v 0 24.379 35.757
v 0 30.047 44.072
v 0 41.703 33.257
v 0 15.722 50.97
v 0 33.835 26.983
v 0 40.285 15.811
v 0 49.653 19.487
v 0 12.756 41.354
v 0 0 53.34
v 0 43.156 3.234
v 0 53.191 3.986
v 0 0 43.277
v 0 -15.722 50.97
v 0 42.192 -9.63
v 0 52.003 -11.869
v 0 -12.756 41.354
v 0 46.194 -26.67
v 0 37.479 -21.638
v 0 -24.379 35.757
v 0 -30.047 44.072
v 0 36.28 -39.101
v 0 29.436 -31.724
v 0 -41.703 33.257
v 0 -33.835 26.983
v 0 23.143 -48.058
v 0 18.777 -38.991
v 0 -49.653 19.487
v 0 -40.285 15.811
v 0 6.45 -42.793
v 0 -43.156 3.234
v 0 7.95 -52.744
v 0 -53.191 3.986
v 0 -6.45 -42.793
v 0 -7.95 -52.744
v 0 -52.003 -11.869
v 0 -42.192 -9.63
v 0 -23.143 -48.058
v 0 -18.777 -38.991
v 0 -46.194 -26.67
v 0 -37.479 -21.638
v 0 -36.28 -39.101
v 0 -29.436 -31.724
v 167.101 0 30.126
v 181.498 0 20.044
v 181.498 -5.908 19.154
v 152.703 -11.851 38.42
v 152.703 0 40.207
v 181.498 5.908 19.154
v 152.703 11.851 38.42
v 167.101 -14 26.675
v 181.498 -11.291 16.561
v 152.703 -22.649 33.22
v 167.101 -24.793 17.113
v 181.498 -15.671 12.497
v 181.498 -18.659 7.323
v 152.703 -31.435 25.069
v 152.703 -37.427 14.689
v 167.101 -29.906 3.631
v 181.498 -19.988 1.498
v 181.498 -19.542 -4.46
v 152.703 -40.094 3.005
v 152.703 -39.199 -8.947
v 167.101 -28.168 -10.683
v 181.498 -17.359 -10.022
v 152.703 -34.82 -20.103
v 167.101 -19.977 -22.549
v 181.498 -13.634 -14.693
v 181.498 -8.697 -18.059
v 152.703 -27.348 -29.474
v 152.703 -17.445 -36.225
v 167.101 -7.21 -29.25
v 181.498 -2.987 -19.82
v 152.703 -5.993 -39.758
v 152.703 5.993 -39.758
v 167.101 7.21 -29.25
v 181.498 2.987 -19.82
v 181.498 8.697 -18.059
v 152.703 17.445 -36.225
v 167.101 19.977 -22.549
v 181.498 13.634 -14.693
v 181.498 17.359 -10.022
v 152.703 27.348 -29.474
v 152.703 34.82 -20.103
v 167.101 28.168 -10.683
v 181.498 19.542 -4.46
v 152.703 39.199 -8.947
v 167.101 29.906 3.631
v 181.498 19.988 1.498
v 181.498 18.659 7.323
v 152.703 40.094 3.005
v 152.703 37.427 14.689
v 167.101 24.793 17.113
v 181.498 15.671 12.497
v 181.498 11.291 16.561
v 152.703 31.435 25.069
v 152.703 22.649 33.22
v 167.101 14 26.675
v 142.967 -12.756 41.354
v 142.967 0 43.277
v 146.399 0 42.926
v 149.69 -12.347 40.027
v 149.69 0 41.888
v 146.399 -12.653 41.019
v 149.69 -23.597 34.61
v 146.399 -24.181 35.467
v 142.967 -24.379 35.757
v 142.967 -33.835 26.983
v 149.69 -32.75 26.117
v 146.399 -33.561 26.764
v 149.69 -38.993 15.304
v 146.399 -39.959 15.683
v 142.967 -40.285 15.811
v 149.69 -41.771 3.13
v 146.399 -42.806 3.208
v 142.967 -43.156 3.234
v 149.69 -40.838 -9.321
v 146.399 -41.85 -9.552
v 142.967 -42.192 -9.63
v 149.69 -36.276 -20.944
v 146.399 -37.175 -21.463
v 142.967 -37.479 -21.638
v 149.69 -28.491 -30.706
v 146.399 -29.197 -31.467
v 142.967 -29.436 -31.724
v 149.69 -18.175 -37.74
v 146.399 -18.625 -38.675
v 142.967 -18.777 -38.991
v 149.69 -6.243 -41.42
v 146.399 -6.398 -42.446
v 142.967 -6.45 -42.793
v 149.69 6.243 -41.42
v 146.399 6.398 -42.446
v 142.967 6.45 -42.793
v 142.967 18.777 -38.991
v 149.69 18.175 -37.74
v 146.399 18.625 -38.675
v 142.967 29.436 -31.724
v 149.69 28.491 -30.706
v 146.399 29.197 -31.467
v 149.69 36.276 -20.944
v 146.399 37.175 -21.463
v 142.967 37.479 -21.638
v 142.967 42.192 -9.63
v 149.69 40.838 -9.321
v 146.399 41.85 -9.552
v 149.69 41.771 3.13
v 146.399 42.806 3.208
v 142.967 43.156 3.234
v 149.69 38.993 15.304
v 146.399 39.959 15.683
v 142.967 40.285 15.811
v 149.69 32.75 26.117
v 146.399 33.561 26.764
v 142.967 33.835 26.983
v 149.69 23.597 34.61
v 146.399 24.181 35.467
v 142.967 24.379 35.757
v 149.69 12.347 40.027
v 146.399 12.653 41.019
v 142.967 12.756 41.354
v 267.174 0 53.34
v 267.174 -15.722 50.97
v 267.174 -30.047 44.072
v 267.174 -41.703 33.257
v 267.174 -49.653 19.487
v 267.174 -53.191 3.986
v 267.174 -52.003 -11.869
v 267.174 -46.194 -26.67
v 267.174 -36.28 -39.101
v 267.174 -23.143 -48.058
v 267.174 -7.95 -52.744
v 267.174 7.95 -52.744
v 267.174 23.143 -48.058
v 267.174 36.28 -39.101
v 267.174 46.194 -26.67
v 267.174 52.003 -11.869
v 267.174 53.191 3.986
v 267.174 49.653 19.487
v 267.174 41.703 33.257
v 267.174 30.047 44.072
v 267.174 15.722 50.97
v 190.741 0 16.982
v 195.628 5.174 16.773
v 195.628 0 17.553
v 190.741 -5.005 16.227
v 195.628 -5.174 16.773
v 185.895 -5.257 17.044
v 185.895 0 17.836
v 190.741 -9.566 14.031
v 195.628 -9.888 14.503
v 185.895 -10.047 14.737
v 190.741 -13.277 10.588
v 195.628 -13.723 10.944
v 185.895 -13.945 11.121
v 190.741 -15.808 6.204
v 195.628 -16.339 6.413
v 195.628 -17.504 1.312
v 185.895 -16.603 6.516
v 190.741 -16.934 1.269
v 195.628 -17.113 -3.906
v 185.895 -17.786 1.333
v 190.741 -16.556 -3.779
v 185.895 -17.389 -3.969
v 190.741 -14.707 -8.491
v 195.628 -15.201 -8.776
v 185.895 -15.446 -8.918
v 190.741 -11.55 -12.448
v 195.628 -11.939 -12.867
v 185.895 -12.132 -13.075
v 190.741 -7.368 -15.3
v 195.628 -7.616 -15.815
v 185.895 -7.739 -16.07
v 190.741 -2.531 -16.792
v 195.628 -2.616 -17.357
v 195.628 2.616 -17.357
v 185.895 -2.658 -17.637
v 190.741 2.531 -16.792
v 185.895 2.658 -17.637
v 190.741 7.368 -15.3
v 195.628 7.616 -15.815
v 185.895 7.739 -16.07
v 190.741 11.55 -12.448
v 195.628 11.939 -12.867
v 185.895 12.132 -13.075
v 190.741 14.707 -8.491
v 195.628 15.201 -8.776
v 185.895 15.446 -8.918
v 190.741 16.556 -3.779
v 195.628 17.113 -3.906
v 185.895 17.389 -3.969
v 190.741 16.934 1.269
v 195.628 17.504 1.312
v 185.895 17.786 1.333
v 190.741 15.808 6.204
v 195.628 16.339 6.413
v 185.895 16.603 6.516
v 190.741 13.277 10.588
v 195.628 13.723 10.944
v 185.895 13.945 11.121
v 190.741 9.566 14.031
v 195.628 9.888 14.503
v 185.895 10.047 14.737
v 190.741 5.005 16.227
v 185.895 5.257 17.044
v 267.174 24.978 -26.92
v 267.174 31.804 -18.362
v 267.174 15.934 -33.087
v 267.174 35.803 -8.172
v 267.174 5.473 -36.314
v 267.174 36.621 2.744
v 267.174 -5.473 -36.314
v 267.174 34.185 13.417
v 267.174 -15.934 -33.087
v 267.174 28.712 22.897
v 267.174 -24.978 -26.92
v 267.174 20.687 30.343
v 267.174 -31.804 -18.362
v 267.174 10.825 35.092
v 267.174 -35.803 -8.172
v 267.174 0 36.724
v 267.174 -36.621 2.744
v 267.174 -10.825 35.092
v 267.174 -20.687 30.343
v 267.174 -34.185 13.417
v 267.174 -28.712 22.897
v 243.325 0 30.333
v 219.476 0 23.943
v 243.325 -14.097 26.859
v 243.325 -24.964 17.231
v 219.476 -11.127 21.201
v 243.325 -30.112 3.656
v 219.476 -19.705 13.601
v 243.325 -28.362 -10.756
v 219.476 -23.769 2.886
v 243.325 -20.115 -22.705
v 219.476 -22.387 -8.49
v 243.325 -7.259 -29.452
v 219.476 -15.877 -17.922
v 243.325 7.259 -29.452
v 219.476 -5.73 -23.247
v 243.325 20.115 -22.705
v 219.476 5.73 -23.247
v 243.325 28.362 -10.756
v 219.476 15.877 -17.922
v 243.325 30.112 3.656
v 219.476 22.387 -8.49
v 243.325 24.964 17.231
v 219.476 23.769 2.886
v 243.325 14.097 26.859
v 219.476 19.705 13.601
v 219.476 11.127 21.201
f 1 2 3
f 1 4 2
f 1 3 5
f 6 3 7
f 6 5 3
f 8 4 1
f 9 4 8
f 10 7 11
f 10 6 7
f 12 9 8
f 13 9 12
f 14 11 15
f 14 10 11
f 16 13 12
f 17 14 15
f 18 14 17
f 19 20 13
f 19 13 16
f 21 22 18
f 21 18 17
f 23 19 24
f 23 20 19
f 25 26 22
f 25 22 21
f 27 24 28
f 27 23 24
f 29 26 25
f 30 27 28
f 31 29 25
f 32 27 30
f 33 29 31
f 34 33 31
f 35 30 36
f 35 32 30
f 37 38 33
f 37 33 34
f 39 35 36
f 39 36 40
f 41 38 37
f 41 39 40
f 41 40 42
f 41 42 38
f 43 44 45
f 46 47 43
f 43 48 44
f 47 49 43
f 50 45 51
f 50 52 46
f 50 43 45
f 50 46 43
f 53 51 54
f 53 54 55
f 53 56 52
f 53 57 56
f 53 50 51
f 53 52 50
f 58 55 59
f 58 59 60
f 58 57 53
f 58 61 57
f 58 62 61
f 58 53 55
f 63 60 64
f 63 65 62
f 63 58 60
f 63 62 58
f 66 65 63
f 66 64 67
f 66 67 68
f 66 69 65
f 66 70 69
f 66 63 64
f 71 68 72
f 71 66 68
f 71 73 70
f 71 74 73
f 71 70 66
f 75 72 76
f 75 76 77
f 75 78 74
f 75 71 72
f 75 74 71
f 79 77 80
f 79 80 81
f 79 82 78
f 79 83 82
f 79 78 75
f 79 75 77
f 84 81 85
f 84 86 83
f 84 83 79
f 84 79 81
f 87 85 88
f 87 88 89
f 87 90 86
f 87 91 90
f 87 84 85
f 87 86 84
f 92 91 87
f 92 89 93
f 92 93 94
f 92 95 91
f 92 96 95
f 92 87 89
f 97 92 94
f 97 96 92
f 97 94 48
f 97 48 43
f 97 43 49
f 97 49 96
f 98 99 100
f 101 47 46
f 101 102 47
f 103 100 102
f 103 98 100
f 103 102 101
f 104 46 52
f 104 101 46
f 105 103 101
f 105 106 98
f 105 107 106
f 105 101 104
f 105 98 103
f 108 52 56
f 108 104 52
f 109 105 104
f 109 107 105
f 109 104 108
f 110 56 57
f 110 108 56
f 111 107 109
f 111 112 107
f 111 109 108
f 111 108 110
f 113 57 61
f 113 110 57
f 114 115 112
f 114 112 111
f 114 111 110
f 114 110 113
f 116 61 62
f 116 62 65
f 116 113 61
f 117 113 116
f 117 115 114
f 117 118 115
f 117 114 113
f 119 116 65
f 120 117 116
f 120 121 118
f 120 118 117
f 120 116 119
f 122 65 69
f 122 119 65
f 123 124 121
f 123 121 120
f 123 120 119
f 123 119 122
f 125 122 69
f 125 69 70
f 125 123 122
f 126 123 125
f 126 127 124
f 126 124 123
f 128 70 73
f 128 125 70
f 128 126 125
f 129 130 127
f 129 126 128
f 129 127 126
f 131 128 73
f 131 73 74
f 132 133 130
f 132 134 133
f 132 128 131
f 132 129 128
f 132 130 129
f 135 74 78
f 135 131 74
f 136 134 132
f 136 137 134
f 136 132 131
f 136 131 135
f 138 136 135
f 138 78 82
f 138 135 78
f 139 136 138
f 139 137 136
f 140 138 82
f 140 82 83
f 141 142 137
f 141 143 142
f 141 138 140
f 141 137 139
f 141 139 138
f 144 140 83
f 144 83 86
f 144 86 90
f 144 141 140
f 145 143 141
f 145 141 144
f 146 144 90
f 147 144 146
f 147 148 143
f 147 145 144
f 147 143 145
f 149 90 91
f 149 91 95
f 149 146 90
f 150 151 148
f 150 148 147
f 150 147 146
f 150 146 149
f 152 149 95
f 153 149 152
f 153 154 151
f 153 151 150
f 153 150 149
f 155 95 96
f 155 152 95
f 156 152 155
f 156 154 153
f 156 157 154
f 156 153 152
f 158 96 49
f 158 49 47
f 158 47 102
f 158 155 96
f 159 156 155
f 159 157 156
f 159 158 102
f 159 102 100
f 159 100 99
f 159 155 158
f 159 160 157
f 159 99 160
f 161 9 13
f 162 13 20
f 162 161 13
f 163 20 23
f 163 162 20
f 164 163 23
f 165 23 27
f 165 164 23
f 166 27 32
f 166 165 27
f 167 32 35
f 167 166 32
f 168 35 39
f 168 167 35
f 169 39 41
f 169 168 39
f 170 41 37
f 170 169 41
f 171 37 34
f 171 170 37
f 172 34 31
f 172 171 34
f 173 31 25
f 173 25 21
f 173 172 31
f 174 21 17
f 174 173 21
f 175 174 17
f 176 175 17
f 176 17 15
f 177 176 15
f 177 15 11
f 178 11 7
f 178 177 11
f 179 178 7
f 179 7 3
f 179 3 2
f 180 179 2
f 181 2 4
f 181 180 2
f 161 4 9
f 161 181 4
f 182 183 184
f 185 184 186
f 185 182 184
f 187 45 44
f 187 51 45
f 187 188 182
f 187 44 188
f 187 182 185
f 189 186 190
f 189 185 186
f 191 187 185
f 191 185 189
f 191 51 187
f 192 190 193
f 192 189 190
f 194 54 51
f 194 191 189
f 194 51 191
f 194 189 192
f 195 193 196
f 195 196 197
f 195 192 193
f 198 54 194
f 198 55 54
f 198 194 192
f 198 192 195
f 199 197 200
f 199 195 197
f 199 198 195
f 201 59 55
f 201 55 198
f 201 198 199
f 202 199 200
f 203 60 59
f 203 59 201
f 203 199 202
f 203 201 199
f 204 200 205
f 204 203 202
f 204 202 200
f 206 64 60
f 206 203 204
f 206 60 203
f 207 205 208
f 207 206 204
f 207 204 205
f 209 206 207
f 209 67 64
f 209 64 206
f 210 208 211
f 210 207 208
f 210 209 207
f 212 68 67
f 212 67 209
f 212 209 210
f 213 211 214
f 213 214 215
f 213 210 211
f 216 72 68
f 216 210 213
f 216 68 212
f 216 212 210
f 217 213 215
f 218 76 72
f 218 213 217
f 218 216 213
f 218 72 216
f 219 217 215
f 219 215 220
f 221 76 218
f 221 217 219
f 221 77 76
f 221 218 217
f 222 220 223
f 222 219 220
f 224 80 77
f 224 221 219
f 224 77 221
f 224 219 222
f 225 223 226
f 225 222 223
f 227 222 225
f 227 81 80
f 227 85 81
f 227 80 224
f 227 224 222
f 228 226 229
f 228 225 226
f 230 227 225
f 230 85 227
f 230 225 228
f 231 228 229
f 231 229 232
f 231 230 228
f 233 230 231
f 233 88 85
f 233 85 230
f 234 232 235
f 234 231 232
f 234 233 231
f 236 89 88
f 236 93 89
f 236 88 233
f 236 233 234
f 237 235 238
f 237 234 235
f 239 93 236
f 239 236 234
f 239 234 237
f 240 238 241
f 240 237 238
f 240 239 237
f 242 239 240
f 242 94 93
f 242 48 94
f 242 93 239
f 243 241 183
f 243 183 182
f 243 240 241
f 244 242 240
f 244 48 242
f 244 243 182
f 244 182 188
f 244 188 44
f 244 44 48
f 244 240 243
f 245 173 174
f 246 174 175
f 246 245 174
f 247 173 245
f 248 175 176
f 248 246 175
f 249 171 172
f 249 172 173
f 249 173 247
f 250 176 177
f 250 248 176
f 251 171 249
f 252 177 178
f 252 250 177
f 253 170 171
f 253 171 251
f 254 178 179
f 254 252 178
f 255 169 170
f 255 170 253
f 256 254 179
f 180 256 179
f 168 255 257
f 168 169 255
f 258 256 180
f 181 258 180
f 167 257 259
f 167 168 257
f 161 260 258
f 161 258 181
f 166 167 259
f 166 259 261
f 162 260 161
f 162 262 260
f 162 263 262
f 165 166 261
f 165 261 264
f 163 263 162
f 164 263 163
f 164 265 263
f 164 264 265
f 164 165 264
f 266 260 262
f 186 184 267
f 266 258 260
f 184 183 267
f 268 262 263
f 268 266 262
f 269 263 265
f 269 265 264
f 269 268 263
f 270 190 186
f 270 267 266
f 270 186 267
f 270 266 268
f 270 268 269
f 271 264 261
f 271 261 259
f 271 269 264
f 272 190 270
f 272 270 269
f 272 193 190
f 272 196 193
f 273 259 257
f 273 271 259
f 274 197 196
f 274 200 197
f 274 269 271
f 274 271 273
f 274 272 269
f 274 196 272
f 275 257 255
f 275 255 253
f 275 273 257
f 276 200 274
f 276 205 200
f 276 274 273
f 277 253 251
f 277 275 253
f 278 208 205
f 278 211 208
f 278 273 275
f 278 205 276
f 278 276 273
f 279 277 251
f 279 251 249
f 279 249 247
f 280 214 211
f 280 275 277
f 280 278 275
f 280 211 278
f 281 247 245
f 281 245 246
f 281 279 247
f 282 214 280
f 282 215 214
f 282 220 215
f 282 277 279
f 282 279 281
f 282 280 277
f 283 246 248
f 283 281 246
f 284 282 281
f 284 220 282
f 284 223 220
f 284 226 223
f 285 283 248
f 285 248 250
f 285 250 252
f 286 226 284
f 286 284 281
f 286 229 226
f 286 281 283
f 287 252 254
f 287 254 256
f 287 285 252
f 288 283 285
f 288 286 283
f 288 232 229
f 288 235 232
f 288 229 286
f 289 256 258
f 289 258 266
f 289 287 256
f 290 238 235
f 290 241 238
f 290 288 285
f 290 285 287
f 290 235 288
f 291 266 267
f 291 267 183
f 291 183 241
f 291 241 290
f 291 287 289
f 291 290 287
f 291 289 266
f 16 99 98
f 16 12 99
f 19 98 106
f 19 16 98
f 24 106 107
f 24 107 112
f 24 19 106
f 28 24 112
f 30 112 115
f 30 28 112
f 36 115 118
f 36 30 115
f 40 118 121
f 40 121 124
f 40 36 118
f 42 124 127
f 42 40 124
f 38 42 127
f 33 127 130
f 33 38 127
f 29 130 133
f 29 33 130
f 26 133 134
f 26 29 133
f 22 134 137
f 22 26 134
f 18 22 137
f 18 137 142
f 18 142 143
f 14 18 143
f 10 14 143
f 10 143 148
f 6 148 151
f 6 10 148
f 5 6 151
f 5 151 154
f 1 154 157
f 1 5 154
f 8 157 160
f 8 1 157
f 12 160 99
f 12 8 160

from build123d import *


with BuildPart() as part:
    # Sketch1 → Revolve1 (revolve)
    with BuildSketch(Plane.XY, mode=Mode.PRIVATE) as revolve1_sk:
        with BuildLine():
            Line((0, 53.34), (267.174285764, 53.34))
            Line((267.174285764, 53.34), (267.174285764, 36.7237391))
            Line((267.174285764, 36.7237391), (195.627584968, 17.5528584))
            ThreePointArc((195.627584968, 17.5528584), (188.286684173, 17.23234775), (181.498114964, 20.044265185))
            Line((181.498114964, 20.044265185), (152.703069528, 40.206773063))
            ThreePointArc((152.703069528, 40.206773063), (148.071235785, 42.490940687), (142.96691498, 43.2765708))
            Line((142.96691498, 43.2765708), (0, 43.2765708))
            Line((0, 43.2765708), (0, 53.34))
        make_face()
    revolve(revolve1_sk.sketch.rotate(Axis((0, 0, 0), (1, 0, 0)), 90), axis=Axis((0, 0, 0), (1, 0, 0)))


solid = part.part
